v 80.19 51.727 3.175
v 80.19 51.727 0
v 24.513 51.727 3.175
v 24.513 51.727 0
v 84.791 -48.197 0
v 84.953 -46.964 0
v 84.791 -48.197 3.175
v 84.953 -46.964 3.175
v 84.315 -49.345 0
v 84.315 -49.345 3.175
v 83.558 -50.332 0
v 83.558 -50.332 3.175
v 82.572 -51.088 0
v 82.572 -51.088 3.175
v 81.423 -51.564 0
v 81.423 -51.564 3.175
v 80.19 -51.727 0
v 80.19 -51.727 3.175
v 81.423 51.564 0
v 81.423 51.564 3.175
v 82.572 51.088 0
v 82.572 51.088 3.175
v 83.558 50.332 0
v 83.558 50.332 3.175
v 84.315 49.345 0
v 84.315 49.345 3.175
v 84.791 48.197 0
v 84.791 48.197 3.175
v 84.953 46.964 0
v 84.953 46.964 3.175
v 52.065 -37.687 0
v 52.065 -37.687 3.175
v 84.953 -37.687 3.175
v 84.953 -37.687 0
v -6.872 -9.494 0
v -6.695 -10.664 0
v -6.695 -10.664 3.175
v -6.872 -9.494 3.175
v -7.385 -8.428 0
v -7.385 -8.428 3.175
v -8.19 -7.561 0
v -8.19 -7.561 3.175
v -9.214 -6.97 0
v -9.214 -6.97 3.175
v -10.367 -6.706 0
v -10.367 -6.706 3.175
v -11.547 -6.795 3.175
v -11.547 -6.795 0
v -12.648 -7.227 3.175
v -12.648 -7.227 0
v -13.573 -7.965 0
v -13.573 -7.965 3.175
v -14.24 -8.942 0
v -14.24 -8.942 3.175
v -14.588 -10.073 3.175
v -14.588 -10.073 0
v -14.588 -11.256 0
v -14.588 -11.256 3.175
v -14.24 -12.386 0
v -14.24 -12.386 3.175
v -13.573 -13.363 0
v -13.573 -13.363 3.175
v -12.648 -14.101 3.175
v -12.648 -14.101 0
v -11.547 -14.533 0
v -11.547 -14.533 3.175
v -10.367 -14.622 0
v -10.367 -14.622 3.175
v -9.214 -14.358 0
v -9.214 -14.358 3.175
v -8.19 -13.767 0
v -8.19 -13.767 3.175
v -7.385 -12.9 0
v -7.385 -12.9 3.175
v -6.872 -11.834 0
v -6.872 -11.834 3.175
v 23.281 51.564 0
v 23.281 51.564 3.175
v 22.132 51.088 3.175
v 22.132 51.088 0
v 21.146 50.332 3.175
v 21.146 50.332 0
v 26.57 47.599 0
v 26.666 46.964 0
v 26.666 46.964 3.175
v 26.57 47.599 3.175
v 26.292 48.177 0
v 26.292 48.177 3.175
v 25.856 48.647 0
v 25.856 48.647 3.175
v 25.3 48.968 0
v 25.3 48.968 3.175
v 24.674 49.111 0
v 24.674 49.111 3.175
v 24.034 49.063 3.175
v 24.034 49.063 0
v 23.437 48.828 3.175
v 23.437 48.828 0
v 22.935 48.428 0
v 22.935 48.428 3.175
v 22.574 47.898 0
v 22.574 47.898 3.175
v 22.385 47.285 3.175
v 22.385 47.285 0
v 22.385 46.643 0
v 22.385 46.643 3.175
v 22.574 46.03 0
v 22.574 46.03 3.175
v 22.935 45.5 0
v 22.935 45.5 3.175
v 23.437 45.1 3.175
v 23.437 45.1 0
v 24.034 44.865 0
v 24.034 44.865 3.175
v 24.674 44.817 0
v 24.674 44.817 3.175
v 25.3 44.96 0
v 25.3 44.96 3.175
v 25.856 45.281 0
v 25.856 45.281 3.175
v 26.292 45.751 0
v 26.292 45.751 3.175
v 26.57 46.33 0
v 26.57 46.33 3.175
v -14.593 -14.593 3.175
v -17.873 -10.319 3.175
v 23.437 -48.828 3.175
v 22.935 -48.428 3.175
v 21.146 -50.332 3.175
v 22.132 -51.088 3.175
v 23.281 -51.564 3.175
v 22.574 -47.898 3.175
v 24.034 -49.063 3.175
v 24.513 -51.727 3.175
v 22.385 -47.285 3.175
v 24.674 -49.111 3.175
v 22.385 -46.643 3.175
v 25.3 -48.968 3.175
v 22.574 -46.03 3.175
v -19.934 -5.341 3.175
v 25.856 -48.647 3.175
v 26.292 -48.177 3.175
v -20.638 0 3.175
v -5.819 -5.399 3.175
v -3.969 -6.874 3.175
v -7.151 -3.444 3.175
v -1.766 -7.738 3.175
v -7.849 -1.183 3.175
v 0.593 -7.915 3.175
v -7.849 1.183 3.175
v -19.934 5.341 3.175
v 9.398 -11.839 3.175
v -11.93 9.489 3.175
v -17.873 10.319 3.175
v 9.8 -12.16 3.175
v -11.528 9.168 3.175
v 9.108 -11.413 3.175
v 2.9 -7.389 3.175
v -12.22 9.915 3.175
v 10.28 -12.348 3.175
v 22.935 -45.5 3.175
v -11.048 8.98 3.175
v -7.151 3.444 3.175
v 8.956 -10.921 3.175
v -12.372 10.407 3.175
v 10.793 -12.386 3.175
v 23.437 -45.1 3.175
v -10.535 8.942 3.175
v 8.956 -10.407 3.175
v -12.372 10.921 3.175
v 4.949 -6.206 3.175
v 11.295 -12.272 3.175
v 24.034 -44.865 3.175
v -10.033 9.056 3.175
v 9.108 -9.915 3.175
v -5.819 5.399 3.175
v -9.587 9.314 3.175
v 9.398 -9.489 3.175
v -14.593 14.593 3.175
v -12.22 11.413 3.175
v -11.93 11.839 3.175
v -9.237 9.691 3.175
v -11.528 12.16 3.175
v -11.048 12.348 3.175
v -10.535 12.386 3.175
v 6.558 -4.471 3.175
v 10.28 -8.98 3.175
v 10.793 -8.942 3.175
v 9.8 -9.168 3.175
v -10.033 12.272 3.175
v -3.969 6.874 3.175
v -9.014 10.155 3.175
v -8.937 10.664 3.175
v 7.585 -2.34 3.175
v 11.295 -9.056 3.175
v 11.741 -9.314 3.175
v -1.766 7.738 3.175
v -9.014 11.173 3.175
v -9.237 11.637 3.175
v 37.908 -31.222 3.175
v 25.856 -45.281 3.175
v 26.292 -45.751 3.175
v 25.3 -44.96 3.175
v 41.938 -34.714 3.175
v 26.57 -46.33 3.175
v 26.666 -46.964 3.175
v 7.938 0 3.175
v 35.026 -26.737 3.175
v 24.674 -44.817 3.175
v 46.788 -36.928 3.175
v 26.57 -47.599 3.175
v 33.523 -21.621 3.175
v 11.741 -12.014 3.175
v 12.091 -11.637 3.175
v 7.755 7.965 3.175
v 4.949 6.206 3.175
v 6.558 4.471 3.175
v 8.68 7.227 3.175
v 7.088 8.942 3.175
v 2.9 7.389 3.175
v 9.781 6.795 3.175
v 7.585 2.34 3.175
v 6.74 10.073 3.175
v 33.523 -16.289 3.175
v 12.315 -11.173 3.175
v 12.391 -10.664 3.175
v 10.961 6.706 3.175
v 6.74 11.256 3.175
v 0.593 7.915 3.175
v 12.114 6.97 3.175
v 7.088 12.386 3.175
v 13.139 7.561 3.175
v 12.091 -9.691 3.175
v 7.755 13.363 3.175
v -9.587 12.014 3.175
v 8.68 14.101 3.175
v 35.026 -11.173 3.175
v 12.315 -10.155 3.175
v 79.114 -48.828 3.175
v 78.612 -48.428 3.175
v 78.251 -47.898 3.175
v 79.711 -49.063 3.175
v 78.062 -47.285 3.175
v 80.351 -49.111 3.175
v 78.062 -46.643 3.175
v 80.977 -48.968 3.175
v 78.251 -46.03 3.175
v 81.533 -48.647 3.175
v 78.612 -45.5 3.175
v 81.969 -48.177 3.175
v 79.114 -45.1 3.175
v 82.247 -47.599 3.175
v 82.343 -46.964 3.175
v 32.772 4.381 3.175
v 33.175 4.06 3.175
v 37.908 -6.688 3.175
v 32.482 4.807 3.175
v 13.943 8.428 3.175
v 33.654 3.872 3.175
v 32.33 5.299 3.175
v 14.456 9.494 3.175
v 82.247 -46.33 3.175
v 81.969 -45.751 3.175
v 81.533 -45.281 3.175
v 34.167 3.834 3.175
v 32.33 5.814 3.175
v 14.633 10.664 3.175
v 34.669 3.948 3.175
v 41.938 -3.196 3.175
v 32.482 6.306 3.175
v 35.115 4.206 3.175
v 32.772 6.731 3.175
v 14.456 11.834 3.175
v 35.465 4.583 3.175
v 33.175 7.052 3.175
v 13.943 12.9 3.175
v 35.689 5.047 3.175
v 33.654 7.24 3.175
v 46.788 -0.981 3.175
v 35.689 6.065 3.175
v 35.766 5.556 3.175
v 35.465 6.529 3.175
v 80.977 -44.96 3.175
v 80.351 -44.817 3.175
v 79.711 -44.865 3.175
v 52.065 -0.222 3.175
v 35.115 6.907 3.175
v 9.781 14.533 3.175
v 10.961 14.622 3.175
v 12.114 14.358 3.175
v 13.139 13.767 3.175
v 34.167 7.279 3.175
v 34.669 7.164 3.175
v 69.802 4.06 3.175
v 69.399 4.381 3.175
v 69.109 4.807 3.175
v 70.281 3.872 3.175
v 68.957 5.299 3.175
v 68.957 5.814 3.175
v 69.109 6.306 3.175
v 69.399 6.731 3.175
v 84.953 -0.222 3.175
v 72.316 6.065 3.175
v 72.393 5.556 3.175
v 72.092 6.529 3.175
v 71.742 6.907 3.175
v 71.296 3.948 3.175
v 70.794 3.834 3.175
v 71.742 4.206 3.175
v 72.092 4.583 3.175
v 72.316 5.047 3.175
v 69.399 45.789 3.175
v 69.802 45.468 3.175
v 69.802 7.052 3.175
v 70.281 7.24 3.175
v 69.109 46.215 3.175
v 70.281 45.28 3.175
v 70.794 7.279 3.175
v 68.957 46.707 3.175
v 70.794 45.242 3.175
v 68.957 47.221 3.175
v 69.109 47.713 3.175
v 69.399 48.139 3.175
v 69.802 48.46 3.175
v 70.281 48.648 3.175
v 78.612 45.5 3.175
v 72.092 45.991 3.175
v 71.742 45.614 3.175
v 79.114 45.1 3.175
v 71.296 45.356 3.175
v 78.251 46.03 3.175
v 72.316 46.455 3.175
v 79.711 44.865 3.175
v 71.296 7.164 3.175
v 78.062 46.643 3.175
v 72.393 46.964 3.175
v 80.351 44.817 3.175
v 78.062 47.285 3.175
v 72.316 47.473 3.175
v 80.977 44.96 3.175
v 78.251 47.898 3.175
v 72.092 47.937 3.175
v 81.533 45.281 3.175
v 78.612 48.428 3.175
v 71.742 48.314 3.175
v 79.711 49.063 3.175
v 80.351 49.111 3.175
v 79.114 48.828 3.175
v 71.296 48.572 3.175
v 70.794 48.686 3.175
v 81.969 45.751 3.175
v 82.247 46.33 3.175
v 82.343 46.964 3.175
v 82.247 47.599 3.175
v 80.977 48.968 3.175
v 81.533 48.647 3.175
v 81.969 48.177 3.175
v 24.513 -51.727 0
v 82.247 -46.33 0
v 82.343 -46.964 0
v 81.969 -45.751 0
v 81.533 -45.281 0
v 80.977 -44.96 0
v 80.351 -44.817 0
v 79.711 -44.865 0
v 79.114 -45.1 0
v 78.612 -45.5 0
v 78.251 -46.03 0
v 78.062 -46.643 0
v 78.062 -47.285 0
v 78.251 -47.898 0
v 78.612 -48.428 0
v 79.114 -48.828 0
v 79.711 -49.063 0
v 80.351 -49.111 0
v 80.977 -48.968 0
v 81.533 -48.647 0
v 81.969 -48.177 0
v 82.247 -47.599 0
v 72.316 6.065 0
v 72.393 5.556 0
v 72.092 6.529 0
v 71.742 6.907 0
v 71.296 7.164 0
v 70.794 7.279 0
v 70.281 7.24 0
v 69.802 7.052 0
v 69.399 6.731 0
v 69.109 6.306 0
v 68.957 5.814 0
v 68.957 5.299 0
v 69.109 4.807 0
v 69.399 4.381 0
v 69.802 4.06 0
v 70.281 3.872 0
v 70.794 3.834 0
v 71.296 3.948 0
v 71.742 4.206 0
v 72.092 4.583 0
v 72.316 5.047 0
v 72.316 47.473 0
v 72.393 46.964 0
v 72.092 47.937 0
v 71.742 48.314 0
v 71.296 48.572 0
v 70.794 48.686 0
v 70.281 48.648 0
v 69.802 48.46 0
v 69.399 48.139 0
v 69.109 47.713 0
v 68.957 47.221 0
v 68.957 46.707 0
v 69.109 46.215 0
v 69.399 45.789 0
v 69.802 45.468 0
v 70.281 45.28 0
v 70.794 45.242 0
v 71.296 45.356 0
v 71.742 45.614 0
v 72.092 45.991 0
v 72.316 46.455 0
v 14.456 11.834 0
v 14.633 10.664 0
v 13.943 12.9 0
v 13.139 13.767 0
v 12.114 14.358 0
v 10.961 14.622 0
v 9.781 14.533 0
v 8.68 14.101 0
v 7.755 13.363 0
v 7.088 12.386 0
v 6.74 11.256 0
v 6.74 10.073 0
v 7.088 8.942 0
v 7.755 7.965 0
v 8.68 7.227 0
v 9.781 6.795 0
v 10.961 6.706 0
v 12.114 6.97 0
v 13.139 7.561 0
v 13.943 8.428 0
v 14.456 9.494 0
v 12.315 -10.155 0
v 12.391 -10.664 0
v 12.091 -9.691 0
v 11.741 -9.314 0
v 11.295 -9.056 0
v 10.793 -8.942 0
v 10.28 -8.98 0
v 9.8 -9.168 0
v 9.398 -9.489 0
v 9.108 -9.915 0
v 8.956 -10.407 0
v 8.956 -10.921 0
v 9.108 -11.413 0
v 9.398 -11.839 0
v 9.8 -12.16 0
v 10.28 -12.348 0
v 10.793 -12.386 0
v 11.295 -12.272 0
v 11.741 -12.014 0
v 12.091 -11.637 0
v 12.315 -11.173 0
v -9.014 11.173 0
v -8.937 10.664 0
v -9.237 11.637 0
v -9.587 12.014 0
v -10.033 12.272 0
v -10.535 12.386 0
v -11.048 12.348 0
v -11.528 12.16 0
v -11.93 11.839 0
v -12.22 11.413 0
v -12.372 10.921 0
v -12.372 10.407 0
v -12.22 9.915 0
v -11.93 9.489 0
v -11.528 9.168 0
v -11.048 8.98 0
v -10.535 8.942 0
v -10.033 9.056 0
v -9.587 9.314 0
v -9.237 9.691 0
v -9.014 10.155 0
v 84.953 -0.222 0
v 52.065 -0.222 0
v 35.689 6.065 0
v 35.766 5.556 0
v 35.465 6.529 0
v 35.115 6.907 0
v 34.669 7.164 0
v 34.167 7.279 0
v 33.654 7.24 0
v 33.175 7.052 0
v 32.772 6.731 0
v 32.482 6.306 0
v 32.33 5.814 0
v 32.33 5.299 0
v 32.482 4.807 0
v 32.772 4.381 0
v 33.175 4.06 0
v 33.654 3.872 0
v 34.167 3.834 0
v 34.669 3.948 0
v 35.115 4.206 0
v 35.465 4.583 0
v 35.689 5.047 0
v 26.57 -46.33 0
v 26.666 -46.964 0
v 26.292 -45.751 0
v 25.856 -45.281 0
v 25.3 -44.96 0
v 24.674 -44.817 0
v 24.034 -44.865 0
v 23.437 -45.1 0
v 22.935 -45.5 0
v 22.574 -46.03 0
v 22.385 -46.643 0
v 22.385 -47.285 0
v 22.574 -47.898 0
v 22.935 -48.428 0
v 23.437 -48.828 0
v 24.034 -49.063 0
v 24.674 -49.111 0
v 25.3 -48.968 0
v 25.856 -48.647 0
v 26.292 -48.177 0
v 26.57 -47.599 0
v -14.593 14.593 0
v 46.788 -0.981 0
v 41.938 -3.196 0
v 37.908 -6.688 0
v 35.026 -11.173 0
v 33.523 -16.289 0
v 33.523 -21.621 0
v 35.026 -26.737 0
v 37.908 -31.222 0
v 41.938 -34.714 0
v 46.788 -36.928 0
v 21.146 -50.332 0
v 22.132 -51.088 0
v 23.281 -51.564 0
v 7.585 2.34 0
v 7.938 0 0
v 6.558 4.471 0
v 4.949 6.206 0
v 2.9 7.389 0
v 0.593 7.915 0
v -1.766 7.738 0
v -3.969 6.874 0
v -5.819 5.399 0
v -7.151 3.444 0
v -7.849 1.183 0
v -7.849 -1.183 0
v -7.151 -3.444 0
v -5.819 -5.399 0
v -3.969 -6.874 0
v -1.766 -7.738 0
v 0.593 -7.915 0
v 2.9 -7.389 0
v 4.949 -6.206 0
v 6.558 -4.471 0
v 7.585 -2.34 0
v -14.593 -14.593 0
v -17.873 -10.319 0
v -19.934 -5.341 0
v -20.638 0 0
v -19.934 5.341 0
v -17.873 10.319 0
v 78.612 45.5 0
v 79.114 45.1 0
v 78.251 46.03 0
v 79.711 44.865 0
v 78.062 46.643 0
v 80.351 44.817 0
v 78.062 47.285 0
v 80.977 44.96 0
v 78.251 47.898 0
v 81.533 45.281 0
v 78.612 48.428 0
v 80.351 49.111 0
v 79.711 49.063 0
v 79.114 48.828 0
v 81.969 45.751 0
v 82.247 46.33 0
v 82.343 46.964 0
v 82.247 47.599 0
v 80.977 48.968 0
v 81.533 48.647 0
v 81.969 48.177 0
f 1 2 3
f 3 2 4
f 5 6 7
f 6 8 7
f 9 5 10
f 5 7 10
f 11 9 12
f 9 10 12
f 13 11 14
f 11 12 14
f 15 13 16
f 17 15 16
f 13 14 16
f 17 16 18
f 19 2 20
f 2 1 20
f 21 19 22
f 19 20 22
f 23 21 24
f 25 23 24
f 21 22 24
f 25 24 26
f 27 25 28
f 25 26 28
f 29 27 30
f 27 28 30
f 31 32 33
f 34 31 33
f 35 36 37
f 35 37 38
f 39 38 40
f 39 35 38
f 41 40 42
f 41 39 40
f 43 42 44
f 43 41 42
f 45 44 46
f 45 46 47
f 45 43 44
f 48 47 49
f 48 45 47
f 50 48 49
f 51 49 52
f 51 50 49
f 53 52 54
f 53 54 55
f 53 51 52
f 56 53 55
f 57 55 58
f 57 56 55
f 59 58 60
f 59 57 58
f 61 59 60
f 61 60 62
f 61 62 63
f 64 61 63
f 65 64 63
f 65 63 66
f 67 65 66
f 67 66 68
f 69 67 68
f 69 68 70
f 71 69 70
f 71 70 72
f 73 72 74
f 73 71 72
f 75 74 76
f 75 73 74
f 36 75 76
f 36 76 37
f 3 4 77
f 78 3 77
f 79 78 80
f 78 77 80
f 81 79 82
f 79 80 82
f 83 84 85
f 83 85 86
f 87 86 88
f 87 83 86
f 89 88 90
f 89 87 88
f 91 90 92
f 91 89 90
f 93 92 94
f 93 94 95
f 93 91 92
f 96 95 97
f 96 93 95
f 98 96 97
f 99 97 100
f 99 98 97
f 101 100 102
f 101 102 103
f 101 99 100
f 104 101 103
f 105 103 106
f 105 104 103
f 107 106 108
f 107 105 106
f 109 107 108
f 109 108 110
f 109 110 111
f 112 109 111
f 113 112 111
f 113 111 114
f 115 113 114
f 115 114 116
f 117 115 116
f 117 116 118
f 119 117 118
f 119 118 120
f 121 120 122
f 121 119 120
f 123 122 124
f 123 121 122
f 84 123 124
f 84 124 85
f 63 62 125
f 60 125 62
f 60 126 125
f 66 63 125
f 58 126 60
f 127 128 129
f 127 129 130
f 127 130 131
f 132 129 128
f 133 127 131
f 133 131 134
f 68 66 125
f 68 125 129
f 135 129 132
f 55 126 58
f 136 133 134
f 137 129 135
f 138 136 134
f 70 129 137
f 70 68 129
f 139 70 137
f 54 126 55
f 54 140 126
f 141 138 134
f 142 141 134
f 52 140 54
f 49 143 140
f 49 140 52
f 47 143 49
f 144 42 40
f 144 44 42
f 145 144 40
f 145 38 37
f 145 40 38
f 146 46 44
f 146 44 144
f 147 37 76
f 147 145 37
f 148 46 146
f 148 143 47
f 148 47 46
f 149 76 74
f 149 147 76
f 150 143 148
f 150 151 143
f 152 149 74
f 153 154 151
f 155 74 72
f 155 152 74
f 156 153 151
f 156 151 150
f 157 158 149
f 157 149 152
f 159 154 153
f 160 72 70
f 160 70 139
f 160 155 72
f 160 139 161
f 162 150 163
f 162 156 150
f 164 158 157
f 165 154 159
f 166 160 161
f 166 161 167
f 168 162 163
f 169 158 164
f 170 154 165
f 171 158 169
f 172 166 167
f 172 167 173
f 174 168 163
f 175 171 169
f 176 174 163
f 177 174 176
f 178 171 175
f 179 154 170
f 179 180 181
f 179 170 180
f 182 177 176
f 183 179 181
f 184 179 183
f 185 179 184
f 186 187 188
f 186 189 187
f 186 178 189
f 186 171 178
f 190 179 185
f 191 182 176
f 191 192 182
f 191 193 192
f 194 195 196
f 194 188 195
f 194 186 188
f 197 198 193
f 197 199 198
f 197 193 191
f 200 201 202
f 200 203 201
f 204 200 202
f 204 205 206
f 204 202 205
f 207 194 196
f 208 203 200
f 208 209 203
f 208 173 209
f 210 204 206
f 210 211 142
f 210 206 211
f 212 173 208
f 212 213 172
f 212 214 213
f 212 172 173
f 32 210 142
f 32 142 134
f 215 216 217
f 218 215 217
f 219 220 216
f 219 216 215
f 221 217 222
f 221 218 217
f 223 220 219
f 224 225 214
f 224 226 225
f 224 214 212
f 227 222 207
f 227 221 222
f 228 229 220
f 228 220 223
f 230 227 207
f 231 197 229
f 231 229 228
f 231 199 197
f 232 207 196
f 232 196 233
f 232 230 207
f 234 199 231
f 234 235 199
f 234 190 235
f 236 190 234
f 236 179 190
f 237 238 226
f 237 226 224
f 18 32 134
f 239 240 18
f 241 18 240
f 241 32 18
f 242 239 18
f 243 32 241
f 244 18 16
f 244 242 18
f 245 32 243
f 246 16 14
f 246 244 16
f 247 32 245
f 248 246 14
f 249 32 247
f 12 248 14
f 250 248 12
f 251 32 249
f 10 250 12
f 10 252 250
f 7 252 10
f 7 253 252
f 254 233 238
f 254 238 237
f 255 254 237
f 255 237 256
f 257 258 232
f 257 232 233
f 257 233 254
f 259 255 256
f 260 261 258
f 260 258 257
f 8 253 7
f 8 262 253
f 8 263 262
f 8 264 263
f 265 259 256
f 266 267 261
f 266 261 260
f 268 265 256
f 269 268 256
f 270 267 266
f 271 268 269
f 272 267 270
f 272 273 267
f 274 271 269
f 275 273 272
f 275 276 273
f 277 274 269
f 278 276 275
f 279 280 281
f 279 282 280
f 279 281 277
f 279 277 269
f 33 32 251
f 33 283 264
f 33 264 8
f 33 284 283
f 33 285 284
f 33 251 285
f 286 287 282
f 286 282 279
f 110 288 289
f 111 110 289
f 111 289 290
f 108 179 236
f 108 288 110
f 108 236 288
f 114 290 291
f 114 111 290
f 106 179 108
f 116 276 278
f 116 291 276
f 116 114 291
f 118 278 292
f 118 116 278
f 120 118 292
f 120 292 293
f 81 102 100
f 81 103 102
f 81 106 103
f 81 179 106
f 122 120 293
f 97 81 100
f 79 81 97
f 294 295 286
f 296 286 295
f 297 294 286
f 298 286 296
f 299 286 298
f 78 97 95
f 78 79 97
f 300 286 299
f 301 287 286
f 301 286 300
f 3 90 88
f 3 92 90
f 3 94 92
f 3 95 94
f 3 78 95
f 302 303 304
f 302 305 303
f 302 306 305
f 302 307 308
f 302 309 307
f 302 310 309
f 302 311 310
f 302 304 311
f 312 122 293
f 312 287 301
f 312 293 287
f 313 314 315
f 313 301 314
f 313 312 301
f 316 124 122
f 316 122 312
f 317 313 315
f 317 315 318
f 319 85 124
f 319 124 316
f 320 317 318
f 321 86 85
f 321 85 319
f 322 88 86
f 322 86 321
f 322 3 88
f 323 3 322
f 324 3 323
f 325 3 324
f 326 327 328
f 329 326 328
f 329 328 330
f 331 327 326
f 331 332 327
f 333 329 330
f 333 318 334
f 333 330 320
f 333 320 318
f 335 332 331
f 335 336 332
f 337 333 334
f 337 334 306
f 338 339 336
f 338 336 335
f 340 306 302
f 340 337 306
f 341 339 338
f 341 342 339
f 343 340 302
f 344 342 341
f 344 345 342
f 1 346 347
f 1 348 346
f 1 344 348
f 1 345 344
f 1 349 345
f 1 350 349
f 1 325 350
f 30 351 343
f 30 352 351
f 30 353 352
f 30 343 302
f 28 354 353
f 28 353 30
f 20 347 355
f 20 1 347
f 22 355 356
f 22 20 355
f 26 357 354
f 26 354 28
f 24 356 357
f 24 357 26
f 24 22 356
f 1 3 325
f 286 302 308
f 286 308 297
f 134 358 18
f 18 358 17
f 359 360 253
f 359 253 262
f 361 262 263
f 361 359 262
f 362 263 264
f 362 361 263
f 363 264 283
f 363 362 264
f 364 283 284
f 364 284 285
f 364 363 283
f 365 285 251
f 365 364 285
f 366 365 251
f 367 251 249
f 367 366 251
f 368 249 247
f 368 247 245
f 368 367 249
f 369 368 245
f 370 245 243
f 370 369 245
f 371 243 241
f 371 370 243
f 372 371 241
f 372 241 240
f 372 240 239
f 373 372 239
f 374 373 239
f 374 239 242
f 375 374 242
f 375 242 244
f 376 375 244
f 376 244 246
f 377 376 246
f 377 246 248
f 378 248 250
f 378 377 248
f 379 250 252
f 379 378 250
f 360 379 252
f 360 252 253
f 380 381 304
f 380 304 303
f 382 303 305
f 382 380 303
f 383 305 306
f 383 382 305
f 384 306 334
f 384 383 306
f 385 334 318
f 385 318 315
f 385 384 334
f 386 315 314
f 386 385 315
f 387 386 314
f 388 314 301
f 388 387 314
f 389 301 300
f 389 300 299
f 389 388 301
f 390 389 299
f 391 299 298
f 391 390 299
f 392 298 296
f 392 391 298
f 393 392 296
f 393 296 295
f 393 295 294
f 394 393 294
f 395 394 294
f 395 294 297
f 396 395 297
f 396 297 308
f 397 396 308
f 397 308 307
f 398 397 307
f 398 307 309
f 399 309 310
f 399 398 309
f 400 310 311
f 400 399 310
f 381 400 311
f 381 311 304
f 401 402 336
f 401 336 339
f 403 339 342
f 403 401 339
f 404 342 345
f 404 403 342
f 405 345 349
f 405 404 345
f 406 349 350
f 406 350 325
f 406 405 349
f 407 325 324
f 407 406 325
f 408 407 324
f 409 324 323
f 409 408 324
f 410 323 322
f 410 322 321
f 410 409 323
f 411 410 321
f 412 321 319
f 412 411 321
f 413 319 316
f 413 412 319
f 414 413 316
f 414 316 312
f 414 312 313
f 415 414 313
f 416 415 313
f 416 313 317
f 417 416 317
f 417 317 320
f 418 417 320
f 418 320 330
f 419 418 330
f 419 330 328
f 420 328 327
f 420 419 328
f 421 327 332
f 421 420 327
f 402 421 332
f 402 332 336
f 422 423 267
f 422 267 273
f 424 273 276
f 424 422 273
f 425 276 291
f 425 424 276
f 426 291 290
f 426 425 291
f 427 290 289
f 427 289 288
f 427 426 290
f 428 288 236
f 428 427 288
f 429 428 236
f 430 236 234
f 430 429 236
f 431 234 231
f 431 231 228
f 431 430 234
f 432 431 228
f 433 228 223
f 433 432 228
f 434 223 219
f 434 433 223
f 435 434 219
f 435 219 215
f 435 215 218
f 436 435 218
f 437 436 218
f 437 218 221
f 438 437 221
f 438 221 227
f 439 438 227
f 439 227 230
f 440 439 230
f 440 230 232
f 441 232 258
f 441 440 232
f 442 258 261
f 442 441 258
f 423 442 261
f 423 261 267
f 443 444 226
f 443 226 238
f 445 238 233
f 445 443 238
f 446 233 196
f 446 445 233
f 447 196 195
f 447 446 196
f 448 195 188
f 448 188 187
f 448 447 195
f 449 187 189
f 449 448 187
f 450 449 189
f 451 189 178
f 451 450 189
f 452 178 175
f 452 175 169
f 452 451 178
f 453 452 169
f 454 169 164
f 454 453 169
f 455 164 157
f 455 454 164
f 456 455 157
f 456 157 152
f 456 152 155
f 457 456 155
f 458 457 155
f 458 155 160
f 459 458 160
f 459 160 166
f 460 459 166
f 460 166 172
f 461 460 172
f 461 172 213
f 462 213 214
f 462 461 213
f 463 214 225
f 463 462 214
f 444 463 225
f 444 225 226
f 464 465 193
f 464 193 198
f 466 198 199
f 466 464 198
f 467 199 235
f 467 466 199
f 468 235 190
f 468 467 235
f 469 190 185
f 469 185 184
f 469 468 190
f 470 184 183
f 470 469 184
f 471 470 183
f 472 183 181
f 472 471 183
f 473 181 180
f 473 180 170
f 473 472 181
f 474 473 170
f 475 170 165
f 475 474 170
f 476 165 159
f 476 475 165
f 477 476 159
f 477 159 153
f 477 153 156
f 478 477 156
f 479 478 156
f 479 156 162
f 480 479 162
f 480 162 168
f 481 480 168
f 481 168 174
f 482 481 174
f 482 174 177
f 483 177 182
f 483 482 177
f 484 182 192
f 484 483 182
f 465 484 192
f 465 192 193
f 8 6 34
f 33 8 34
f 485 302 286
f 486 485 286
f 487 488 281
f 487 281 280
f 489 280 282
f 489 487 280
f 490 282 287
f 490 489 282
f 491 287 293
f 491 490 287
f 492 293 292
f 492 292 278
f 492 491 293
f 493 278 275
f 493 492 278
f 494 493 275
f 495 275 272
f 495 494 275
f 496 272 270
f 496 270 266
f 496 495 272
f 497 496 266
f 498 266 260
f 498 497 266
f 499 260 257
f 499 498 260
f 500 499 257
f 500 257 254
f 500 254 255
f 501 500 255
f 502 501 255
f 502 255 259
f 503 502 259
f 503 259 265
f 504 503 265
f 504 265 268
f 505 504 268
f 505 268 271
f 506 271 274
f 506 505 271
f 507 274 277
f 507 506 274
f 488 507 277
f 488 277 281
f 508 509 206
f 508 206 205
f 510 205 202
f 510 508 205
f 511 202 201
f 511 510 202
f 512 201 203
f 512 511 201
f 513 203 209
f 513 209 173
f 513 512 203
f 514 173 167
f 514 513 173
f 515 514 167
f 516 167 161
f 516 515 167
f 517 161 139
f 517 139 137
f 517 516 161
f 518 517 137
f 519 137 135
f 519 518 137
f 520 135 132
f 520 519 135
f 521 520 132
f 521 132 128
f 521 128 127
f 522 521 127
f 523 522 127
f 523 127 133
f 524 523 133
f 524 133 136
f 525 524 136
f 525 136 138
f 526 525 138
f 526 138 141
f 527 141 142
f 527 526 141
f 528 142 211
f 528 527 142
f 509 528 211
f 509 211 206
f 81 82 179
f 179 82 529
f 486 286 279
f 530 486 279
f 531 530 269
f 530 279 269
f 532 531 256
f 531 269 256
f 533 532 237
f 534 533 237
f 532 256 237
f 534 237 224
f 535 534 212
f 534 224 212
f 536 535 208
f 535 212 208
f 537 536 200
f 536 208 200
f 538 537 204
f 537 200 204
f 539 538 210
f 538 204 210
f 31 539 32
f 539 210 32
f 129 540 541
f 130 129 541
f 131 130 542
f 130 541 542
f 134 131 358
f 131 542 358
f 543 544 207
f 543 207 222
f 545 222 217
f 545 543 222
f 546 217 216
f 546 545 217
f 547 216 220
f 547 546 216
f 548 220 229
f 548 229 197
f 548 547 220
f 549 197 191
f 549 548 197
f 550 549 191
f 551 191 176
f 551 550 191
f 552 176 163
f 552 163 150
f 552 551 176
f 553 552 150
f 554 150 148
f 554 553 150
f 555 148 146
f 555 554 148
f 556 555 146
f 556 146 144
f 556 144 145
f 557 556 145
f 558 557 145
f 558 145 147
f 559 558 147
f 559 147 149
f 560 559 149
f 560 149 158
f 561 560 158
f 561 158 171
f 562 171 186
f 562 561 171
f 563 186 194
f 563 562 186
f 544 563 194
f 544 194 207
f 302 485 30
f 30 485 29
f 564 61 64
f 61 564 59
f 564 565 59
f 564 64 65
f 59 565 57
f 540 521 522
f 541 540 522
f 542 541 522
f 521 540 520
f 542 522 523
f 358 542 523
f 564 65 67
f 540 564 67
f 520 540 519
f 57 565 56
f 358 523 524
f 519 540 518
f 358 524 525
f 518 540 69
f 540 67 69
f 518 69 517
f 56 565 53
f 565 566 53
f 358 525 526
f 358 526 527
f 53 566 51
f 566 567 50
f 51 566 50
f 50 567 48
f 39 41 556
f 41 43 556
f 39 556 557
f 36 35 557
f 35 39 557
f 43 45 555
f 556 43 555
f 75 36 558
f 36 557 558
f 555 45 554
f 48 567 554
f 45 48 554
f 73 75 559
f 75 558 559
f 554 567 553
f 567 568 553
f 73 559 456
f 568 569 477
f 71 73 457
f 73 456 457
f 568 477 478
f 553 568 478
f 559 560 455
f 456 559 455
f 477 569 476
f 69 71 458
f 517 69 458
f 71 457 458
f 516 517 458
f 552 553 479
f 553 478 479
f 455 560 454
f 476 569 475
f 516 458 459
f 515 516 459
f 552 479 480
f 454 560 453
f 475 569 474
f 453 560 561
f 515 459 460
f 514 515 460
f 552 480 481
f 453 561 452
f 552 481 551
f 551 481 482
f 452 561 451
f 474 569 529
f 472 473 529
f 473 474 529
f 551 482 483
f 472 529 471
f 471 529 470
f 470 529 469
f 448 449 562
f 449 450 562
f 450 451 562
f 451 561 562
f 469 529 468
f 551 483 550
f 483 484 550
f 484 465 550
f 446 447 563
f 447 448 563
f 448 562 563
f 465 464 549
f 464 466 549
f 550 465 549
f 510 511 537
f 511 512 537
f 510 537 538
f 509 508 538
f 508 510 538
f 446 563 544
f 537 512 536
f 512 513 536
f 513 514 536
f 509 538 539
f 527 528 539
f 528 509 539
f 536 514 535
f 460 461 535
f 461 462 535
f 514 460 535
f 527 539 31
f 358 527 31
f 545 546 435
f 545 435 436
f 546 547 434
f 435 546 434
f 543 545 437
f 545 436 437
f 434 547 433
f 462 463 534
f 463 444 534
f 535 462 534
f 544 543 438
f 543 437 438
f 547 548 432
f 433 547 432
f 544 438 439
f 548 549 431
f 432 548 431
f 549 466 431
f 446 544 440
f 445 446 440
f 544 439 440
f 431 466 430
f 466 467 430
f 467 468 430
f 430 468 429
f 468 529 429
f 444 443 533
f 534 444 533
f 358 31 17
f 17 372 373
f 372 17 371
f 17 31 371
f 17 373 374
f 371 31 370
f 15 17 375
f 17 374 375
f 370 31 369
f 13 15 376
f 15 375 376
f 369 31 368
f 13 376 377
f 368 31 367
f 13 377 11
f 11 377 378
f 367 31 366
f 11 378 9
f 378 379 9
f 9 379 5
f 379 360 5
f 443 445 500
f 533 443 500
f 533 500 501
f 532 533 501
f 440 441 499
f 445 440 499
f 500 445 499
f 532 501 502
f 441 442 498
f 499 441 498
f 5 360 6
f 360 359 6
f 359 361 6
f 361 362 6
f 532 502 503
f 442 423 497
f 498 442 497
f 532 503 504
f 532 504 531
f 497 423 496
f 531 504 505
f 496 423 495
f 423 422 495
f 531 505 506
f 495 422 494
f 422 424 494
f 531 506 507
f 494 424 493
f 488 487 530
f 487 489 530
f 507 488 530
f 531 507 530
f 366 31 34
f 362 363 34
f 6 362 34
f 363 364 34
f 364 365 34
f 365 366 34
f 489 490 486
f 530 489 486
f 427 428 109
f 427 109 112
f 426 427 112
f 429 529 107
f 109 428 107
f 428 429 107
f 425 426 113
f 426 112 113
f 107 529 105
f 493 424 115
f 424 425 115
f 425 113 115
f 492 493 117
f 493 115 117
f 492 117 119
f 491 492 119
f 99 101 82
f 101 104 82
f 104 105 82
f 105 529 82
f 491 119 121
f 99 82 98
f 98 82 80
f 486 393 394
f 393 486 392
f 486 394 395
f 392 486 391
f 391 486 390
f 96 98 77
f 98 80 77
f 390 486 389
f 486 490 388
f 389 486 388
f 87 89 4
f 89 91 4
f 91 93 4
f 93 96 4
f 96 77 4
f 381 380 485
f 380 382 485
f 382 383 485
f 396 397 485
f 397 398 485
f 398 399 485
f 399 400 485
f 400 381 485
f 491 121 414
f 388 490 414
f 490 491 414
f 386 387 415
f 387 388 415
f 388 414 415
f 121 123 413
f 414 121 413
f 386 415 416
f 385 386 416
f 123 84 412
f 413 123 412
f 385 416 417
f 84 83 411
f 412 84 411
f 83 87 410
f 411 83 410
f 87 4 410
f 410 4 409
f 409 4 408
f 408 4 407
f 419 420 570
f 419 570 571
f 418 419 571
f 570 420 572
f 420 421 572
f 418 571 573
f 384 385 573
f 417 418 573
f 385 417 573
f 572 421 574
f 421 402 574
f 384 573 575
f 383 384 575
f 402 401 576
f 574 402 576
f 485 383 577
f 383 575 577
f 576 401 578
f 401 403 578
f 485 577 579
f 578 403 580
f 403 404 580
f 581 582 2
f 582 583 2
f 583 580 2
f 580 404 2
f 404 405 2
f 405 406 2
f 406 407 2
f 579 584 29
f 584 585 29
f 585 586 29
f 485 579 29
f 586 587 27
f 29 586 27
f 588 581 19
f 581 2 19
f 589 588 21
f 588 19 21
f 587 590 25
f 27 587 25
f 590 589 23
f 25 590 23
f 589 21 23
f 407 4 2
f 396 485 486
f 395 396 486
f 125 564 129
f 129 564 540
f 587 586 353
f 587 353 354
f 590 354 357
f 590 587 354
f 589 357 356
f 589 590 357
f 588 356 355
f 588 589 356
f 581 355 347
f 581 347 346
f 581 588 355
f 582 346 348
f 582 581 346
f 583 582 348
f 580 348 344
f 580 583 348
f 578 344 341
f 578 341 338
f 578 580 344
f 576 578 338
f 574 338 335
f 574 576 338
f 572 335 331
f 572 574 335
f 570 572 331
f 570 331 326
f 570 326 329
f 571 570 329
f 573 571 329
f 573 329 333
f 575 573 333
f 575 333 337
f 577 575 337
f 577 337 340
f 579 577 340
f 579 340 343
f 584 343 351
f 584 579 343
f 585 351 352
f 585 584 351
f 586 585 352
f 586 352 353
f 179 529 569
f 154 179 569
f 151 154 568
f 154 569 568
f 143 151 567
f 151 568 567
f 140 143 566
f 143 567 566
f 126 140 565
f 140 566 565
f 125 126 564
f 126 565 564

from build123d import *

# Parameters (mm, degrees)
F0_R     = 2.15265
F0_R_2   = 3.96875
F0_R_3   = 7.9375
F0_R_4   = 1.7272
F1_DEPTH = 3.175
F2_R     = 4.7625
F4_DEPTH = 3.175


with BuildPart() as f1:
    # F0 (on Top) → F1 (new body)
    with BuildSketch(Plane.XY):
        with BuildLine():
            Line((21.1458048519, 50.3316372454), (-14.5929161967, 14.5929161967))
            ThreePointArc((-14.5929161967, 14.5929161967), (-20.6375, 0), (-14.5929161967, -14.5929161967))
            Line((-14.5929161967, -14.5929161967), (21.1458048519, -50.3316372454))
            ThreePointArc((21.1458048519, -50.3316372454), (22.6908710507, -51.3640174736), (24.5134008973, -51.7265412))
            Line((24.5134008973, -51.7265412), (84.9529040973, -51.7265412))
            Line((84.9529040973, -51.7265412), (84.9529040973, 51.7265412))
            Line((84.9529040973, 51.7265412), (24.5134008973, 51.7265412))
            ThreePointArc((24.5134008973, 51.7265412), (22.6908710507, 51.3640174736), (21.1458048519, 50.3316372454))
        make_face()
        with Locations((24.5134008973, -46.9640412)):
            Circle(F0_R, mode=Mode.SUBTRACT)
        with Locations((-10.6640541438, -10.6640541438)):
            Circle(F0_R_2, mode=Mode.SUBTRACT)
        Circle(F0_R_3, mode=Mode.SUBTRACT)
        with Locations((10.6640541438, -10.6640541438)):
            Circle(F0_R_4, mode=Mode.SUBTRACT)
        with Locations((80.1904040973, -46.9640412)):
            Circle(F0_R, mode=Mode.SUBTRACT)
        with Locations((-10.6640541438, 10.6640541438)):
            Circle(F0_R_4, mode=Mode.SUBTRACT)
        with Locations((10.6640541438, 10.6640541438)):
            Circle(F0_R_2, mode=Mode.SUBTRACT)
        with Locations((24.5134008973, 46.9640412)):
            Circle(F0_R, mode=Mode.SUBTRACT)
        with Locations((34.0384008973, 5.55625)):
            Circle(F0_R_4, mode=Mode.SUBTRACT)
        with Locations((70.6654040973, 5.55625)):
            Circle(F0_R_4, mode=Mode.SUBTRACT)
        with Locations((70.6654040973, 46.9640412)):
            Circle(F0_R_4, mode=Mode.SUBTRACT)
        with Locations((80.1904040973, 46.9640412)):
            Circle(F0_R, mode=Mode.SUBTRACT)
    extrude(amount=F1_DEPTH)

    # F2
    f2_edges = [f1.edges().sort_by_distance(p)[0] for p in [
        (84.952904, 51.726541, 1.5875),
        (84.952904, -51.726541, 1.5875),
    ]]
    fillet(f2_edges, radius=F2_R)

    # F3 (on face) → F4 (cut, through all)
    with BuildSketch(Plane.XY.offset(3.175)):
        with BuildLine():
            Line((52.0652126973, -37.68725), (84.9529040973, -37.68725))
            Line((84.9529040973, -37.68725), (84.9529040973, -0.22225))
            Line((84.9529040973, -0.22225), (52.0652126973, -0.22225))
            ThreePointArc((52.0652126973, -0.22225), (33.3327126973, -18.95475), (52.0652126973, -37.68725))
        make_face()
    extrude(amount=-F4_DEPTH, mode=Mode.SUBTRACT)


solid = f1.part
